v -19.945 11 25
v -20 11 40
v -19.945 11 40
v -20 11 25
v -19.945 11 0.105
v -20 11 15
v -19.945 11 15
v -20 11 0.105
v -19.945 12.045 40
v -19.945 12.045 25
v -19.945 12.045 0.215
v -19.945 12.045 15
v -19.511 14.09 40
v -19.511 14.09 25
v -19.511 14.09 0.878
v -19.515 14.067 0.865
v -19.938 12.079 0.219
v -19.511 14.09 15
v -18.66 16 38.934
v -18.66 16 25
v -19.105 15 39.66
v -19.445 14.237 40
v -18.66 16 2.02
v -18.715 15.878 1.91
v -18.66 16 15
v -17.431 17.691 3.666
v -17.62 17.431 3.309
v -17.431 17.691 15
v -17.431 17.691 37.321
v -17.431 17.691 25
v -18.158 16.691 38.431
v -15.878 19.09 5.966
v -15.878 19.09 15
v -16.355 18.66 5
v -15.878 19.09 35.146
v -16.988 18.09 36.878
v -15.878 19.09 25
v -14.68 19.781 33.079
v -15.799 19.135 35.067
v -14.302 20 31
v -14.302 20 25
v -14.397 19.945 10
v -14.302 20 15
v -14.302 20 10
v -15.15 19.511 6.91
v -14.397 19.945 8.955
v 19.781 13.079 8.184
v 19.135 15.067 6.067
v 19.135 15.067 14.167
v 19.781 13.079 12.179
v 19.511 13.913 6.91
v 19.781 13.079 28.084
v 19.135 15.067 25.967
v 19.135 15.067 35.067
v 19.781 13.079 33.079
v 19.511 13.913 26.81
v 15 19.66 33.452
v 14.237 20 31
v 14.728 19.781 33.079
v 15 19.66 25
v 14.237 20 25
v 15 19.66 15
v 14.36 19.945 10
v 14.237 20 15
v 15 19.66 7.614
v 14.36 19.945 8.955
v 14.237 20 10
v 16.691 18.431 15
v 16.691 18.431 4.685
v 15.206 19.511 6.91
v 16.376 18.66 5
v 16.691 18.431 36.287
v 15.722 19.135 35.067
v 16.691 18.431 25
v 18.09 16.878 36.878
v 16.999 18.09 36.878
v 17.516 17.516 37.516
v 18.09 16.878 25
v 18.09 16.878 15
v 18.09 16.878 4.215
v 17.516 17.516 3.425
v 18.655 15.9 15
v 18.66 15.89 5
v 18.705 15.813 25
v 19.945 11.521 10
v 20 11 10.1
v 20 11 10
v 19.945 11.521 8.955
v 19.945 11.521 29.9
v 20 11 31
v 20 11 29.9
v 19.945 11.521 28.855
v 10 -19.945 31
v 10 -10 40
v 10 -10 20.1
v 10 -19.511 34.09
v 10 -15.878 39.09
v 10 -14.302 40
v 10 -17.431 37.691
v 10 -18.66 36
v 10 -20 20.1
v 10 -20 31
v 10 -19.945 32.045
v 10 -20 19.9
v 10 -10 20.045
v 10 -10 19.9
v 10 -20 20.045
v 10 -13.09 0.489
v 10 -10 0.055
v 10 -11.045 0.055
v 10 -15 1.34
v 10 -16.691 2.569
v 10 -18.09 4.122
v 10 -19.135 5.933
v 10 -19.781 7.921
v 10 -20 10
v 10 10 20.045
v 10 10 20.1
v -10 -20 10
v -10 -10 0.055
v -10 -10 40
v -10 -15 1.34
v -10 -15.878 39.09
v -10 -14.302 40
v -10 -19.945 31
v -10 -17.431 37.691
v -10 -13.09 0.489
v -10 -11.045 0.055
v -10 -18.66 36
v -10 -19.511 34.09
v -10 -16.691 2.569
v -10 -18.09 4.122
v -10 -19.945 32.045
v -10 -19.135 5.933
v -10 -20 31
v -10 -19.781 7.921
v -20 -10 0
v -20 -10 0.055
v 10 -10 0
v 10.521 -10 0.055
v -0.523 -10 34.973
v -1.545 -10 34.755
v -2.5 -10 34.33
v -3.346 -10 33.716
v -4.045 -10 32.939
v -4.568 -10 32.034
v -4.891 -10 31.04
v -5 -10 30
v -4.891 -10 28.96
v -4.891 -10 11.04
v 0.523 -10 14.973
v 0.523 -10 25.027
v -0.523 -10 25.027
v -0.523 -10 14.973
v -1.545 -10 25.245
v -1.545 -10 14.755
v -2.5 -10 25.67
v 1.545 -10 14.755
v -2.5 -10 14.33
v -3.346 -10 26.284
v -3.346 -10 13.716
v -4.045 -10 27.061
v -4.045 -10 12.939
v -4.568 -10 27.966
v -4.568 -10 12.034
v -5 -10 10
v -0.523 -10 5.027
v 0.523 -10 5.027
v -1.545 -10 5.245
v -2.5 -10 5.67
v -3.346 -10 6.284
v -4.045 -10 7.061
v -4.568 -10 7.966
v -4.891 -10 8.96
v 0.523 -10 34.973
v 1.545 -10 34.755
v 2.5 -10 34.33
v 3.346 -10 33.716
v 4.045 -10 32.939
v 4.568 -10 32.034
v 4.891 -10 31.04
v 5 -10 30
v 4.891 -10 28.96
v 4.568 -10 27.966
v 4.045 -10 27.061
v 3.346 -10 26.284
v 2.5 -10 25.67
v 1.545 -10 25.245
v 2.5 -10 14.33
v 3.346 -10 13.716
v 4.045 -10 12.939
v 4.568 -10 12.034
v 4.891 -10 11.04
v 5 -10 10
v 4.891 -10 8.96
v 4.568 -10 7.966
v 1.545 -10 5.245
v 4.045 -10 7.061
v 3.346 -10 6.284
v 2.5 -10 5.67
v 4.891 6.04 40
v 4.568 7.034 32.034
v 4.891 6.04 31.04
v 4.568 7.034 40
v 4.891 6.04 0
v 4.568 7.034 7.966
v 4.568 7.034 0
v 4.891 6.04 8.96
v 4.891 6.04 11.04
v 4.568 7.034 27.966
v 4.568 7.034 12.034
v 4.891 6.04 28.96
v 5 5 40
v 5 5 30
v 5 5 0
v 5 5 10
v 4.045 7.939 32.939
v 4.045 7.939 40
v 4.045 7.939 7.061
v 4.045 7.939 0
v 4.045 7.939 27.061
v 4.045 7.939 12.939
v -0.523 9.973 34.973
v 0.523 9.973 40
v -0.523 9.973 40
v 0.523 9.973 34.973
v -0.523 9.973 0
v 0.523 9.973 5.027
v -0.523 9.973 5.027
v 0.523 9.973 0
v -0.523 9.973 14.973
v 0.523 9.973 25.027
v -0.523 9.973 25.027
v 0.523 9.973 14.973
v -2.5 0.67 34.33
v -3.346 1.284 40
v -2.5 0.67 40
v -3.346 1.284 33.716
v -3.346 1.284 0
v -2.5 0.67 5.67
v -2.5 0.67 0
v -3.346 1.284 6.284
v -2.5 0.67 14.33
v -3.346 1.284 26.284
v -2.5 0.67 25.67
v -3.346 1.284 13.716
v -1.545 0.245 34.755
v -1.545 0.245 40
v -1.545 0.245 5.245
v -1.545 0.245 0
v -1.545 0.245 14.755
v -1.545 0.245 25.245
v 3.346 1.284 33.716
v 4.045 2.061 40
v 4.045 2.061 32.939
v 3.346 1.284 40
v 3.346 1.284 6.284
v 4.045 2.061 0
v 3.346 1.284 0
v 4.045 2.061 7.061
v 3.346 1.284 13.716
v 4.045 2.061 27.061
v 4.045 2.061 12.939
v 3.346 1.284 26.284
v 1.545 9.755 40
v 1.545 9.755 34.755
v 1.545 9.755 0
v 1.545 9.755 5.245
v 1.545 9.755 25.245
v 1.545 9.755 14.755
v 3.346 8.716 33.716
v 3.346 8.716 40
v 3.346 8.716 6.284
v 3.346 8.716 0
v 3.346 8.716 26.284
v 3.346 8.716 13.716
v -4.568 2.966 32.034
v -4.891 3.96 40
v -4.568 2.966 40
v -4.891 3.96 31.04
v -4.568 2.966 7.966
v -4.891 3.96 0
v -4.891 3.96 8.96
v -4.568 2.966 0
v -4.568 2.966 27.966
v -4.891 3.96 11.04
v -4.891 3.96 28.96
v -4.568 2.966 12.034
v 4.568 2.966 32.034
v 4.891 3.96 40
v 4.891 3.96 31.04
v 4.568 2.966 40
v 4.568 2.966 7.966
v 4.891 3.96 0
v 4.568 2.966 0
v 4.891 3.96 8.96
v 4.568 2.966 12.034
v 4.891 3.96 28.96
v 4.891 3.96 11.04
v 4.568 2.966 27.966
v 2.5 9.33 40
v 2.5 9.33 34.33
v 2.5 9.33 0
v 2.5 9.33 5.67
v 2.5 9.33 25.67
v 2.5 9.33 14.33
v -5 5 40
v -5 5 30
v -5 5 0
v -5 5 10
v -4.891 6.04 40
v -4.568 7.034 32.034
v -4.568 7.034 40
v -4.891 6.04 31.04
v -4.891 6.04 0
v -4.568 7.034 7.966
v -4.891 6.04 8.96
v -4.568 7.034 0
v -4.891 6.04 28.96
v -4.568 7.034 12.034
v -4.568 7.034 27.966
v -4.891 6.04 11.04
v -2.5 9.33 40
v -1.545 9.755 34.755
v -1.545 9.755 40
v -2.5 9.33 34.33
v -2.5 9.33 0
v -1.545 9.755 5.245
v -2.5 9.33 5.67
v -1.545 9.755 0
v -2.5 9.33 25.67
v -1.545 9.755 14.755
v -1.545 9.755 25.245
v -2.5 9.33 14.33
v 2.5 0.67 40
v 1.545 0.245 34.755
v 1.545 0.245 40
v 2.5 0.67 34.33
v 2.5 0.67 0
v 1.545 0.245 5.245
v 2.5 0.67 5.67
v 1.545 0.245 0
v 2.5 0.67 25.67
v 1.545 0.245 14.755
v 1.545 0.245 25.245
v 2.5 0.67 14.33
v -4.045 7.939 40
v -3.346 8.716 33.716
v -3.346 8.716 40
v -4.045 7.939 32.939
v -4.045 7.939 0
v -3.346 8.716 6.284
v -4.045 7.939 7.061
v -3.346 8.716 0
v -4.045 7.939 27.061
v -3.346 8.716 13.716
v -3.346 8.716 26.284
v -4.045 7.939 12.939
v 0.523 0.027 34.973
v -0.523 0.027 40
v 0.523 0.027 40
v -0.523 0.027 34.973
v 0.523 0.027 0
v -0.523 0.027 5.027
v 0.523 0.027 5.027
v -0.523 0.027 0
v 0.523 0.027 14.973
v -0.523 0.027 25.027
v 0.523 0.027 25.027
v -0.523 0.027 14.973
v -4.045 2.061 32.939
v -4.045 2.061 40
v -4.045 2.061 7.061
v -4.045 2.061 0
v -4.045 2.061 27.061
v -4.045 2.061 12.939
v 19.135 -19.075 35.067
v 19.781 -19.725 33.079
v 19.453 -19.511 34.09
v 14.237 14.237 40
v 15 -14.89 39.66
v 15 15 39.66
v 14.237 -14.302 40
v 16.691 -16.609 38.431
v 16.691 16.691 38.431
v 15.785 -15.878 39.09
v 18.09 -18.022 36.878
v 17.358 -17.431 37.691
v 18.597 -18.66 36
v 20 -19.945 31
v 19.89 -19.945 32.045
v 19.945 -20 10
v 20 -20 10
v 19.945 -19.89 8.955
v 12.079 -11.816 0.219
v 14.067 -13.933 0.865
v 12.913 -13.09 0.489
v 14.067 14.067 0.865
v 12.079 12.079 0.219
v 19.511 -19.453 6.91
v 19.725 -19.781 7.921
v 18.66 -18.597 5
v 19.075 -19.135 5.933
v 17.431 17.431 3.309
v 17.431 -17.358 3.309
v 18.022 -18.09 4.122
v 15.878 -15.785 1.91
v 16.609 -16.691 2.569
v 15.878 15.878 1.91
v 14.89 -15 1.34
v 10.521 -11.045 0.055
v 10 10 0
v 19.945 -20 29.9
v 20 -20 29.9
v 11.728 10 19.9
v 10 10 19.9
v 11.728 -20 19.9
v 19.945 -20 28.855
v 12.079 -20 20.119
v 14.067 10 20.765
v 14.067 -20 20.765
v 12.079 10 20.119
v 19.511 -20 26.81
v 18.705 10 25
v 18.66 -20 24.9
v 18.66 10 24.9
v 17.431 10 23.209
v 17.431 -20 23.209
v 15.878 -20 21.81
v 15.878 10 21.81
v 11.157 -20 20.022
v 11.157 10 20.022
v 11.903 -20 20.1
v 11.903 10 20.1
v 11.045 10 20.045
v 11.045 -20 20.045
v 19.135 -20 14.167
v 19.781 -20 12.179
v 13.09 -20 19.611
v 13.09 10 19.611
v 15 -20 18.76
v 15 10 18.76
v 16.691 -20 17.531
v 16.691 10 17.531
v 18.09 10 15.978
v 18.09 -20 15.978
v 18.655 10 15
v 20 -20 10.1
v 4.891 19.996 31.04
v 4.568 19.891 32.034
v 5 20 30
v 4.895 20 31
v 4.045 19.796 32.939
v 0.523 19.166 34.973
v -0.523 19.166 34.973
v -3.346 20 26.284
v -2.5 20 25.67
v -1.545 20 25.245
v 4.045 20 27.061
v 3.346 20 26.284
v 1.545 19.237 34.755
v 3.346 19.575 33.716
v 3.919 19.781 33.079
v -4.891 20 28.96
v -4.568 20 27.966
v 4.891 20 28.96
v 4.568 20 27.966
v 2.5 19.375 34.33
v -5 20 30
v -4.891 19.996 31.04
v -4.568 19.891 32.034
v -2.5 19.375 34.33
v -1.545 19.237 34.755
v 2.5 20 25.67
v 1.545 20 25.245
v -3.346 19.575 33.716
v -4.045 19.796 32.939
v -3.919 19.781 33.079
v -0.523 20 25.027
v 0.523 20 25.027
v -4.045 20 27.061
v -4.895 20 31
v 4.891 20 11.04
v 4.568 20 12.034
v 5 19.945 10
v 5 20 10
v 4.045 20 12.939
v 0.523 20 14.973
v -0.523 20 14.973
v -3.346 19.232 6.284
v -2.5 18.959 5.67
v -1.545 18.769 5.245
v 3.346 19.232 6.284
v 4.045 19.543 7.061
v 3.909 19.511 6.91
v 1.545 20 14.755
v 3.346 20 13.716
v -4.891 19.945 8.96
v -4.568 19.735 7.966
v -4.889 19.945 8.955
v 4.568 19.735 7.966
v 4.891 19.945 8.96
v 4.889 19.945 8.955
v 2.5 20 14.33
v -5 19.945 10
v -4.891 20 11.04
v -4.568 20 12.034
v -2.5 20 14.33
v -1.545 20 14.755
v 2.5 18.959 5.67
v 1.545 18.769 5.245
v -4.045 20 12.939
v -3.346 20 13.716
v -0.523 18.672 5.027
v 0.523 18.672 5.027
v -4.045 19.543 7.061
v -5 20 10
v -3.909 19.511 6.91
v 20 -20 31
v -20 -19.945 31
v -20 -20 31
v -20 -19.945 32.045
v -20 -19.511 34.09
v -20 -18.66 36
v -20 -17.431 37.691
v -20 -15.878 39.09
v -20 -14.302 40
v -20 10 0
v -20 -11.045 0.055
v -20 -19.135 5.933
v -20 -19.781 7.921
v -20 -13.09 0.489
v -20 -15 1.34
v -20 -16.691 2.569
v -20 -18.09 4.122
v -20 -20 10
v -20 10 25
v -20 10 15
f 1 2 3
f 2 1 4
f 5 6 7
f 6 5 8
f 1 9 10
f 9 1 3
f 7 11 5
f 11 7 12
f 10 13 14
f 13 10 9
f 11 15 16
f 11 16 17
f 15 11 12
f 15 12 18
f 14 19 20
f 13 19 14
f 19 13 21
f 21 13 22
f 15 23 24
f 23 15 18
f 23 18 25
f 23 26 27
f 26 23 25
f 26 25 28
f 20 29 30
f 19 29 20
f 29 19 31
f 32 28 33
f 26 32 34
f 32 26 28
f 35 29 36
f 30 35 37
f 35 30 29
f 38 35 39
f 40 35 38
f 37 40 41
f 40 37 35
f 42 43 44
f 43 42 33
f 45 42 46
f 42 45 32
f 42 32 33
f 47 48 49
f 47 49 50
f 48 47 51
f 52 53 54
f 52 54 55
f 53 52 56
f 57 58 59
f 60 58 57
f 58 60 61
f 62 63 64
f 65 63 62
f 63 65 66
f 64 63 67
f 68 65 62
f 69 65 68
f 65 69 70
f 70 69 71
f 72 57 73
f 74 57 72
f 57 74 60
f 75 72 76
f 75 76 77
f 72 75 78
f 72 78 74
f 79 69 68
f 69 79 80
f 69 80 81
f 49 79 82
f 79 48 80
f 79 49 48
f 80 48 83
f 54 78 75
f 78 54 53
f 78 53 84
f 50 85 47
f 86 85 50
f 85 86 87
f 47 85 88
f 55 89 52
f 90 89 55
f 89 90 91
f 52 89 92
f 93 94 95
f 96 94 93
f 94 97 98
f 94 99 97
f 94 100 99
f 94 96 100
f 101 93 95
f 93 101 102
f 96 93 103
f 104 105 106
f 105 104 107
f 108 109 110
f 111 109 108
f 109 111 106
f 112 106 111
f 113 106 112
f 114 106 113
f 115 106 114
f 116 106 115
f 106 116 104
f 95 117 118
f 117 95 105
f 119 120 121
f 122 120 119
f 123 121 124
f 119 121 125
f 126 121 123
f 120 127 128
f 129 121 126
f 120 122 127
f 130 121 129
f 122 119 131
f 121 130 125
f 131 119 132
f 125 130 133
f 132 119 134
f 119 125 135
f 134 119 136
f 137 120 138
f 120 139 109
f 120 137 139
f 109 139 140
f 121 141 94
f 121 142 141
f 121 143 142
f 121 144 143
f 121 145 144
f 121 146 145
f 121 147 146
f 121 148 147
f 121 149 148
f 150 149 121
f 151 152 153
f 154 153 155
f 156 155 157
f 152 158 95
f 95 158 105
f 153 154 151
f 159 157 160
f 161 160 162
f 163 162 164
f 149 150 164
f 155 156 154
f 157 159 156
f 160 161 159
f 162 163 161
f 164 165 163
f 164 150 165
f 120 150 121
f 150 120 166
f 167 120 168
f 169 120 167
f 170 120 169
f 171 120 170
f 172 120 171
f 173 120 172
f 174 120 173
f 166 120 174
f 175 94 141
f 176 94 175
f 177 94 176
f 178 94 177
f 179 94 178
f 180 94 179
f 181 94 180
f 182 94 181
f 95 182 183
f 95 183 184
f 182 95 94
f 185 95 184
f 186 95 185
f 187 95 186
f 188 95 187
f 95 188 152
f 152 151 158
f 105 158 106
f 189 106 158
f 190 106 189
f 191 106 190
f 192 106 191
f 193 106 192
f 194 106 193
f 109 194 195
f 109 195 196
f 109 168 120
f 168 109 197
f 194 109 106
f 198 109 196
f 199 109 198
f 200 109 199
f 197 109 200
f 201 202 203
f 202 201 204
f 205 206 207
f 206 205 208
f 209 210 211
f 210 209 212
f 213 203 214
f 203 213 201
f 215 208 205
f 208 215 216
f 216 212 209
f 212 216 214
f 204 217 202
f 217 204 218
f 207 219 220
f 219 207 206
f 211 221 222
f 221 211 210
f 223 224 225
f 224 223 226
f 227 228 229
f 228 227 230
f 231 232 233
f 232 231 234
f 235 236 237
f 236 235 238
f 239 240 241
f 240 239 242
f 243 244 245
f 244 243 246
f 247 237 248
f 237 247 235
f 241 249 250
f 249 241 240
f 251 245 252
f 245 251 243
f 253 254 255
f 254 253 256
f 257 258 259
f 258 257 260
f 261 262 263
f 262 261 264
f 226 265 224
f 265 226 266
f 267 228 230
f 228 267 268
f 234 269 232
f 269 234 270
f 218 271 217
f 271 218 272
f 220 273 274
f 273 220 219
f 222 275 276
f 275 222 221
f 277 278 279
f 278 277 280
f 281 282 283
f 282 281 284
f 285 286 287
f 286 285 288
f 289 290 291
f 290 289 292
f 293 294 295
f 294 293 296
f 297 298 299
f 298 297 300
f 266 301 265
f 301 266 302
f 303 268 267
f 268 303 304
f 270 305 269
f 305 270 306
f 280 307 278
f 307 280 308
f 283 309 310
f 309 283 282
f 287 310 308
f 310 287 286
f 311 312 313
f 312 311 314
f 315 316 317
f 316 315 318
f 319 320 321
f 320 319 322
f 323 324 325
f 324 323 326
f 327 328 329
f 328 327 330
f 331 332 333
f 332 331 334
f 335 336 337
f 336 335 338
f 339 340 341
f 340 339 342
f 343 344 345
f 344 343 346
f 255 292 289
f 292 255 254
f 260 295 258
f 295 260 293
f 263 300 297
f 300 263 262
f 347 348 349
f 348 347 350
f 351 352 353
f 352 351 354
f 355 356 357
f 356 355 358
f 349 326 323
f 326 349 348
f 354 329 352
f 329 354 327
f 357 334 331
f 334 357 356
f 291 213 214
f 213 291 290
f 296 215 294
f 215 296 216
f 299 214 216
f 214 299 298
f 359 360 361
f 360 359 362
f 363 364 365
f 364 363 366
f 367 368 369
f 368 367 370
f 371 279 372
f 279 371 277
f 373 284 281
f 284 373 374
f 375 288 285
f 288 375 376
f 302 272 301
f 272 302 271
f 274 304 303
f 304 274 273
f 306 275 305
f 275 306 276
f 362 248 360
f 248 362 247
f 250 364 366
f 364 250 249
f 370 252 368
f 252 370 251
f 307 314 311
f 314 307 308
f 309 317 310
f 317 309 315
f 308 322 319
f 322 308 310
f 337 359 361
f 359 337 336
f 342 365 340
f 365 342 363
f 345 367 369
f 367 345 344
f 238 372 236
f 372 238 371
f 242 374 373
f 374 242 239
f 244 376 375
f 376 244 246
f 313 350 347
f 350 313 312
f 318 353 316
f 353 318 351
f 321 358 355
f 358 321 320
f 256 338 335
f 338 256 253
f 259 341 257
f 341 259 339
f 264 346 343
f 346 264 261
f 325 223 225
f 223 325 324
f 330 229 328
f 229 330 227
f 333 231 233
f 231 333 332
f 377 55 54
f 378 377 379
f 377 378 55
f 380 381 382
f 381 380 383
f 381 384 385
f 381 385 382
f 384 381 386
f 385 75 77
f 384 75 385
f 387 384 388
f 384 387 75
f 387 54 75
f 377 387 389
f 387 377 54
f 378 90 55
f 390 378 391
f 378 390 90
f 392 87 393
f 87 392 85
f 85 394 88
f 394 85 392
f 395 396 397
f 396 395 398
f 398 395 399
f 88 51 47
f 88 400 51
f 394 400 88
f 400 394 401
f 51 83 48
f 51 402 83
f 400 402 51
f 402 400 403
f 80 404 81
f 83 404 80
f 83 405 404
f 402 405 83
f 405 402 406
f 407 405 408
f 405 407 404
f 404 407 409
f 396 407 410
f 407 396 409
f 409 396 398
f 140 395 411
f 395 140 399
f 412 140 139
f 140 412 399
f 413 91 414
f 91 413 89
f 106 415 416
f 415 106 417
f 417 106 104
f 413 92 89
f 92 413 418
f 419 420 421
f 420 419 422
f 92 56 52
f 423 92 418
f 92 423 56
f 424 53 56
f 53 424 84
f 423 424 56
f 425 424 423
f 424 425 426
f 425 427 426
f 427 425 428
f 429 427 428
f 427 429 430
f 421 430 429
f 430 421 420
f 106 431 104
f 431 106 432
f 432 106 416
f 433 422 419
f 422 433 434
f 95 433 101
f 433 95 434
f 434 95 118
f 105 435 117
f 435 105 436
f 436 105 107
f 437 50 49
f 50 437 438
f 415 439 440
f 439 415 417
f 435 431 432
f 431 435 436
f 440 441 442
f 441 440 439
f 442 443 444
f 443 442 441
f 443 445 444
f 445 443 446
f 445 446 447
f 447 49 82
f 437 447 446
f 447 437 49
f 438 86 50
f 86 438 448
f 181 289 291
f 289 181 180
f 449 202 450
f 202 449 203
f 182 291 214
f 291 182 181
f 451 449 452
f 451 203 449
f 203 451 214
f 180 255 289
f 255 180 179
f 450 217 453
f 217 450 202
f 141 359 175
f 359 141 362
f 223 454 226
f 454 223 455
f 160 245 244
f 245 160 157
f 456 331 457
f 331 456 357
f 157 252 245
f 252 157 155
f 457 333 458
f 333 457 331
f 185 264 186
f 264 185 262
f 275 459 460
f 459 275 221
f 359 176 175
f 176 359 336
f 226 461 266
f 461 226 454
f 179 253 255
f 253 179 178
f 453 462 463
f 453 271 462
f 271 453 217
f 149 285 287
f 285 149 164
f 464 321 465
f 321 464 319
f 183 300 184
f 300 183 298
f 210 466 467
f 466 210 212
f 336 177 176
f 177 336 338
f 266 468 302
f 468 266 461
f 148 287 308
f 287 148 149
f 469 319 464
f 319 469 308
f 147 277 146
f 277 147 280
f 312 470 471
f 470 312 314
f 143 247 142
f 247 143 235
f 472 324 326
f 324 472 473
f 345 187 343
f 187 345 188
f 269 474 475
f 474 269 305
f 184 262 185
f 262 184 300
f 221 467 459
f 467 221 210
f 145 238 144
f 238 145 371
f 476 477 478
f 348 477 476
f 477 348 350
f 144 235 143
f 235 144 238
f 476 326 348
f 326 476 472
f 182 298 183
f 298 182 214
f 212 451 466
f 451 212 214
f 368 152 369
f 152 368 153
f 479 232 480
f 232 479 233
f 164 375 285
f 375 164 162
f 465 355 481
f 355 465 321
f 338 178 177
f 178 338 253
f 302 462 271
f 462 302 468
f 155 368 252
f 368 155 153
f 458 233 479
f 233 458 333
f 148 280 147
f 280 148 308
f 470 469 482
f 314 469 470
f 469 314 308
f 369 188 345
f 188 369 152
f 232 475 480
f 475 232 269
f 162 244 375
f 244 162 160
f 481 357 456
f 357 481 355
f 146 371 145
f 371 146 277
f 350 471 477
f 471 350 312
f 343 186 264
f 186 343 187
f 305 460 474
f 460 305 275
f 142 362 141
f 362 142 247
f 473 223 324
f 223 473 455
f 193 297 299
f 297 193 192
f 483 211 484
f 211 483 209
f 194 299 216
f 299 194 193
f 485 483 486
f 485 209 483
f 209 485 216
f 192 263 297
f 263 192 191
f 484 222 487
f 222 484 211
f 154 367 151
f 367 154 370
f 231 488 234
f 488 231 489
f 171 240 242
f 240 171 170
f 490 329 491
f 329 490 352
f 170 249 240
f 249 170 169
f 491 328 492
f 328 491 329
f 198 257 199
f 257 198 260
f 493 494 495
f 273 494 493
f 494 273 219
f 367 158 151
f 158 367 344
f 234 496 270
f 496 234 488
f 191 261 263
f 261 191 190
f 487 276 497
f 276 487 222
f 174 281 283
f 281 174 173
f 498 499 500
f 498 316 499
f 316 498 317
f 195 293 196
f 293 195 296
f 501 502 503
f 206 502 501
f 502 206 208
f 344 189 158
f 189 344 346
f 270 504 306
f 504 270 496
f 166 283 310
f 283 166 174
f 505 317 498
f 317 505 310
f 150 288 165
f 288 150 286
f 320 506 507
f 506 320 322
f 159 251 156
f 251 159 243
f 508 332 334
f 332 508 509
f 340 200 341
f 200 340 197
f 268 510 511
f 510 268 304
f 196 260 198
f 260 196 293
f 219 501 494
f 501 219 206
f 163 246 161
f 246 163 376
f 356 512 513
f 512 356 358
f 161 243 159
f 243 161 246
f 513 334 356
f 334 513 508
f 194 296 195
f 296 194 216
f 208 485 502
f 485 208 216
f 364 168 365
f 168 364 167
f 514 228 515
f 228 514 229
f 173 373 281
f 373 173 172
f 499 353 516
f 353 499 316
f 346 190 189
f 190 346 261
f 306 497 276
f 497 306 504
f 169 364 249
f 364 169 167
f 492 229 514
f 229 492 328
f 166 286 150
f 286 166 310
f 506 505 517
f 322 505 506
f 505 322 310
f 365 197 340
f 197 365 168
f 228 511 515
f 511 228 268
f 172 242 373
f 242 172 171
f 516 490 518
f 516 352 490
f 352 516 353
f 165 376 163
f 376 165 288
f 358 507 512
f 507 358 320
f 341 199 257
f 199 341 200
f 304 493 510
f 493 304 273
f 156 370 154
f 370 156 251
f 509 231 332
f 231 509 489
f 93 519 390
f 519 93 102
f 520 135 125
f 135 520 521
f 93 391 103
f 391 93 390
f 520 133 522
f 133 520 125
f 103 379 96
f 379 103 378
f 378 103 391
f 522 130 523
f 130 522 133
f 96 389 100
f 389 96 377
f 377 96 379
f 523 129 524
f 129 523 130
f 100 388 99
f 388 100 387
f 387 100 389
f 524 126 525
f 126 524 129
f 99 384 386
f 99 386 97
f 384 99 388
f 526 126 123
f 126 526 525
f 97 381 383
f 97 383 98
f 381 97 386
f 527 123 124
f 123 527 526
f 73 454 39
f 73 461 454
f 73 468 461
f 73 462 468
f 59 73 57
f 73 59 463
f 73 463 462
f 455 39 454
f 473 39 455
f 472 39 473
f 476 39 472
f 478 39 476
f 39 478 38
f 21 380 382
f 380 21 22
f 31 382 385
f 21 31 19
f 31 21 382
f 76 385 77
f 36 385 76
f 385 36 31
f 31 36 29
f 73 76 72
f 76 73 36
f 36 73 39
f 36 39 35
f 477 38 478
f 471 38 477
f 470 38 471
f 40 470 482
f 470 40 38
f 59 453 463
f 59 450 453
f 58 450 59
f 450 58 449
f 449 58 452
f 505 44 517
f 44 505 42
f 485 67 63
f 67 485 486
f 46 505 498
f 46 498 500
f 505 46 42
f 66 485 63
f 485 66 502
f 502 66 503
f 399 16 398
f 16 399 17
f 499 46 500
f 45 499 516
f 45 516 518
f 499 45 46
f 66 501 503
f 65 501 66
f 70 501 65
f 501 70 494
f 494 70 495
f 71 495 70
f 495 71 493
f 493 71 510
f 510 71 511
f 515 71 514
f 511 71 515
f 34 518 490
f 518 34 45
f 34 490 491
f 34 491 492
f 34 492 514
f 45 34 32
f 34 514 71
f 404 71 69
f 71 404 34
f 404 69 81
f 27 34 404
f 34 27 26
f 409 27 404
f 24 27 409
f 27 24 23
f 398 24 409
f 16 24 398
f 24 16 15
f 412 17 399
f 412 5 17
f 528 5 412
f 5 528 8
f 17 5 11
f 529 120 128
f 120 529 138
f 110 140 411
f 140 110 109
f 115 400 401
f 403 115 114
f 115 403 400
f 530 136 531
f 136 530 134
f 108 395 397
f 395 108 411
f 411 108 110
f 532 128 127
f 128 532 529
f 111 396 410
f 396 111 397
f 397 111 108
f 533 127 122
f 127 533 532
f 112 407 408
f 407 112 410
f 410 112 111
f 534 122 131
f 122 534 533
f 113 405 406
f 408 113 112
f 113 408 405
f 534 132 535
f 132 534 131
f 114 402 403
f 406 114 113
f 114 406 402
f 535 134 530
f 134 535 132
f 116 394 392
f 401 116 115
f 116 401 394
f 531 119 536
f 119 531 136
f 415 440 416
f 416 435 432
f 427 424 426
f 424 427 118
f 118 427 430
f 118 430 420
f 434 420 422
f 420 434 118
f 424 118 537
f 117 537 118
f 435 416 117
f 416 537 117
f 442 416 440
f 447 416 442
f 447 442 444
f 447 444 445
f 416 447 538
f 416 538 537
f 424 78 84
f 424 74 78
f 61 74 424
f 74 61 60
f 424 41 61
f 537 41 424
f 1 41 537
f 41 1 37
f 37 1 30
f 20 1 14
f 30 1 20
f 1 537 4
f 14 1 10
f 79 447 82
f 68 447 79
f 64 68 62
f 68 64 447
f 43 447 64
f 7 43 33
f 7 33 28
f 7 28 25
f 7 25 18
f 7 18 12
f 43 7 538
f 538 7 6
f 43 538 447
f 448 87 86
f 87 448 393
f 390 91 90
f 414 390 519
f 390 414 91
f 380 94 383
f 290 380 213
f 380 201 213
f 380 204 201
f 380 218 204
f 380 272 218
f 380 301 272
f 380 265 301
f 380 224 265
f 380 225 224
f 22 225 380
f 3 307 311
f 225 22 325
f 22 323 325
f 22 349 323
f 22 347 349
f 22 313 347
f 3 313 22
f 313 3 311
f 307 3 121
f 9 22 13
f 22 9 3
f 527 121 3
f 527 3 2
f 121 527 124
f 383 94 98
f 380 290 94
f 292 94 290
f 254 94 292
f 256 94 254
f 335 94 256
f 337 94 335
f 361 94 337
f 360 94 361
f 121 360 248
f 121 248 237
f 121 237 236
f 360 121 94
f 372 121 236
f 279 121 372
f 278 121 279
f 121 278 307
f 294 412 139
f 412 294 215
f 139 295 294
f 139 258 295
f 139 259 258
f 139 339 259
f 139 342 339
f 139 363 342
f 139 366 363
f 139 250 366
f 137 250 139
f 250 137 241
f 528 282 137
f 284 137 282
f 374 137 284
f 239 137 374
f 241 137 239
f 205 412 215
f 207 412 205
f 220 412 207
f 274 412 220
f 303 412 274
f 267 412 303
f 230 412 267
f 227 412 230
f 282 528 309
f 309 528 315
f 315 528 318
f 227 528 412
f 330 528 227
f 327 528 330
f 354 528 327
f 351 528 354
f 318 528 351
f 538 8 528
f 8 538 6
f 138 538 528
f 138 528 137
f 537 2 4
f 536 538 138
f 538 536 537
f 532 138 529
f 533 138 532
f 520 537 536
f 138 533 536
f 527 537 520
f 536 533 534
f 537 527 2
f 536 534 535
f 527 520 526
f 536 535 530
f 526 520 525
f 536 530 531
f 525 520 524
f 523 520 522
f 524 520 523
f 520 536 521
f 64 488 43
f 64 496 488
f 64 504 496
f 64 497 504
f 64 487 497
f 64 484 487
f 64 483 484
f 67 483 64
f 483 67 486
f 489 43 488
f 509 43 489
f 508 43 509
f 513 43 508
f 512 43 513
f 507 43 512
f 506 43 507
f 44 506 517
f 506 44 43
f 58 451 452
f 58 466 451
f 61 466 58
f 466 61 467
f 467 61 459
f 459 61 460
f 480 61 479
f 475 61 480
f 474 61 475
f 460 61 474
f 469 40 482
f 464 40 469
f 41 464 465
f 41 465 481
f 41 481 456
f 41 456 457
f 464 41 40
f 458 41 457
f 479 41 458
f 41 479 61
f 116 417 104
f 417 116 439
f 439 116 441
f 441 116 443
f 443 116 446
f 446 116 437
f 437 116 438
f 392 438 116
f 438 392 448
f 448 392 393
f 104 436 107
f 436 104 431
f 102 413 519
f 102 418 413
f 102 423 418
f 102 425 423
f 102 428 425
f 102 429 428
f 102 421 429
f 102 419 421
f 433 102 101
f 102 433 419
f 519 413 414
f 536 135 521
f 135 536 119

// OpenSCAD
// Monogram Cube
// v 1.1
// Inspired by the cover art of Douglas Hofstadter's "Godel, Escher, Bach"
//
// (C) Copyright 2013, Brian Enigma, some rights reserved.
//
// Monogram Cube by Brian Enigma is licensed under a Creative Commons 
// Attribution-ShareAlike 3.0 Unported License.
//
// - http://netninja.com
// - http://www.thingiverse.com/BrianEnigma

// Note that certain letter combinations don't work well, especially with the "alternate" typeface.

SIZE = 40 * 1;
DETAIL = 30 * 1;

// The typeface to use.  "Blocks" yields better results, but is more stylistic and block-like.  It reminds me of some display typefaces from the 20s and 30s. It has smaller overhangs and is easier to print.  "Alternate" results in more consistently letter-like, less stylized results, but has more overhangs and is harder to print.
typeface = "blocks";     // [blocks, alternate]

top_letter = "A";        // [A,B,C,D,E,F,G,H,I,J,K,L,M,N,O,P,Q,R,S,T,U,V,W,X,Y,Z,None]
left_side_letter = "B";  // [A,B,C,D,E,F,G,H,I,J,K,L,M,N,O,P,Q,R,S,T,U,V,W,X,Y,Z,None]
right_side_letter = "C"; // [A,B,C,D,E,F,G,H,I,J,K,L,M,N,O,P,Q,R,S,T,U,V,W,X,Y,Z,None]


//include <letters.scad>

// ----------------------------------------
// Monogram Cube
// v 1.1
// Inspired by the cover art of Douglas Hofstadter's "Godel, Escher, Bach"
//
// (C) Copyright 2013, Brian Enigma, some rights reserved.
//
// Monogram Cube by Brian Enigma is licensed under a Creative Commons 
// Attribution-ShareAlike 3.0 Unported License.
//
// - http://netninja.com
// - http://www.thingiverse.com/BrianEnigma

// arc() builds a lower-left corner arc by default
// +
// |\
// |  \
// |    \
// +------+
module arc(cubeSize, rotation, x, y)
{
    translate(v = [(cubeSize / 4 + 1) / 2 + x, (cubeSize / 4 + 1) / 2 + y, (cubeSize + 2) / 2 - 1])
		rotate(a = [0, 0, -1 * rotation])
		    translate(v = [(cubeSize / 4 + 1) / -2, (cubeSize / 4 + 1) / -2, (cubeSize + 2) / -2])
		        difference()
		        {
		            cube(size = [cubeSize / 4 + 1, cubeSize / 4 + 1, cubeSize + 2]);
		            translate(v = [cubeSize / 4 + 1, cubeSize / 4 + 1, 0])
		                cylinder(r = cubeSize / 4, h = cubeSize + 2, $fn = DETAIL);
		        }
}

module arcWithMargin(cubeSize, rotation, marginX, marginY, x, y)
{
	if (90 == rotation || 270 == rotation)
	{
	    translate(v = [(cubeSize / 4 + marginY) / 2 + x, (cubeSize / 4 + marginX) / 2 + y, (cubeSize + 2) / 2 - 1])
			rotate(a = [0, 0, -1 * rotation])
			    translate(v = [(cubeSize / 4 + marginX) / -2, (cubeSize / 4 + marginY) / -2, (cubeSize + 2) / -2])
			        difference()
			        {
			            cube(size = [cubeSize / 4 + marginX, cubeSize / 4 + marginY, cubeSize + 2]);
			            translate(v = [cubeSize / 4 + marginX, cubeSize / 4 + marginY, 0])
			                cylinder(r = cubeSize / 4, h = cubeSize + 2, $fn = DETAIL);
			        }
	} else {
	    translate(v = [(cubeSize / 4 + marginX) / 2 + x, (cubeSize / 4 + marginY) / 2 + y, (cubeSize + 2) / 2 - 1])
			rotate(a = [0, 0, -1 * rotation])
			    translate(v = [(cubeSize / 4 + marginX) / -2, (cubeSize / 4 + marginY) / -2, (cubeSize + 2) / -2])
			        difference()
			        {
			            cube(size = [cubeSize / 4 + marginX, cubeSize / 4 + marginY, cubeSize + 2]);
			            translate(v = [cubeSize / 4 + marginX, cubeSize / 4 + marginY, 0])
			                cylinder(r = cubeSize / 4, h = cubeSize + 2, $fn = DETAIL);
			        }
	}
}

module carveLetterA(cubeSize)
{
    // lower cut-out
    translate(v = [cubeSize / 4, -1, -1])
        cube(size = [cubeSize / 2, cubeSize / 4 + 1, cubeSize + 2]);
    // center hole
    translate(v = [cubeSize / 2, cubeSize * 5 / 8, -1])
        cylinder(r = cubeSize / 8, h = cubeSize + 2, $fn = DETAIL);
    // top left corner curve
	arc(cubeSize, 90, -1, cubeSize * 3 / 4 + 1);
    // top right corner curve
	arc(cubeSize, 180, cubeSize * 3 / 4, cubeSize * 3 / 4 + 1);
}

module carveLetterB(cubeSize)
{
    // center holes
    translate(v = [cubeSize / 2, cubeSize * 3 / 4, -1])
        cylinder(r = cubeSize / 8, h = cubeSize + 2, $fn = DETAIL);
    translate(v = [cubeSize / 2, cubeSize * 1 / 4, -1])
        cylinder(r = cubeSize / 8, h = cubeSize + 2, $fn = DETAIL);
    // top right corner curve
	arc(cubeSize, 180, cubeSize * 3 / 4, cubeSize * 3 / 4 + 1);
    // bottom right corner curve
	arc(cubeSize, 270, cubeSize * 3 / 4, -1);
    // edge divot
	arcWithMargin(cubeSize, 270, 0, 5, cubeSize * 3 / 4, cubeSize / 2 - 0.1); // upper
	arcWithMargin(cubeSize, 180, 5, 0, cubeSize * 3 / 4, cubeSize / 4 + 0.1); // lower
}

module carveLetterC(cubeSize)
{
    // top left corner curve
	arc(cubeSize, 90, -1, cubeSize * 3 / 4 + 1);
    // top right corner curve
	arc(cubeSize, 180, cubeSize * 3 / 4, cubeSize * 3 / 4 + 1);
    // bottom right corner curve
	arc(cubeSize, 270, cubeSize * 3 / 4, -1);
    // bottom left corner curve
	arc(cubeSize, 0, -1, -1);
	// Cutout
    translate(v = [cubeSize * 3 / 4, cubeSize * 3 / 8, -1])
		cube(size = [cubeSize / 4 + 1, cubeSize / 4, cubeSize + 2]);
}

module carveLetterCAlt(cubeSize)
{
    // top left corner curve
	arc(cubeSize, 90, -1, cubeSize * 3 / 4 + 1);
    // top right corner curve
	arc(cubeSize, 180, cubeSize * 3 / 4, cubeSize * 3 / 4 + 1);
    // bottom right corner curve
	arc(cubeSize, 270, cubeSize * 3 / 4, -1);
    // bottom left corner curve
	arc(cubeSize, 0, -1, -1);
	// Cutout
	translate(v = [cubeSize / 2, cubeSize / 2, -1])
		cylinder(r = cubeSize / 4, h = cubeSize + 2, $fn = DETAIL);
    translate(v = [cubeSize / 2, cubeSize / 4, -1])
		cube(size = [cubeSize / 2 + 1, cubeSize / 2, cubeSize + 2]);
}

module carveLetterD(cubeSize)
{
    // center hole
    translate(v = [cubeSize / 2, cubeSize / 2, -1])
        cylinder(r = cubeSize / 8, h = cubeSize + 2, $fn = DETAIL);
    // top right corner curve
	arc(cubeSize, 180, cubeSize * 3 / 4, cubeSize * 3 / 4 + 1);
    // bottom right corner curve
	arc(cubeSize, 270, cubeSize * 3 / 4, -1);
}

module carveLetterDAlt(cubeSize)
{
    // top right corner curve
	arc(cubeSize, 180, cubeSize * 3 / 4, cubeSize * 3 / 4 + 1);
    // bottom right corner curve
	arc(cubeSize, 270, cubeSize * 3 / 4, -1);
	// Cutout
	translate(v = [cubeSize / 2, cubeSize / 2, -1])
		cylinder(r = cubeSize / 4, h = cubeSize + 2, $fn = DETAIL);
    translate(v = [cubeSize / 4, cubeSize / 4, -1])
		cube(size = [cubeSize / 4, cubeSize / 2, cubeSize + 2]);
}

module carveLetterE(cubeSize)
{
    // upper cut-out
    translate(v = [cubeSize * 3 / 4, cubeSize * 5 / 8, -1])
        cube(size = [cubeSize / 4 + 1, cubeSize / 8, cubeSize + 2]);
    // lower cut-out
    translate(v = [cubeSize * 3 / 4, cubeSize / 4, -1])
        cube(size = [cubeSize / 4 + 1, cubeSize / 8, cubeSize + 2]);
}

module carveLetterEAlt(cubeSize)
{
    // upper cut-out
    translate(v = [cubeSize / 4, cubeSize * 5 / 8, -1])
        cube(size = [cubeSize * 3 / 4 + 1, cubeSize / 8, cubeSize + 2]);
    // lower cut-out
    translate(v = [cubeSize / 4, cubeSize  / 4, -1])
        cube(size = [cubeSize * 3 / 4 + 1, cubeSize / 8, cubeSize + 2]);
	// middle prong
    translate(v = [cubeSize * 5 / 8, cubeSize * 3 / 8 - 1, -1])
        cube(size = [cubeSize / 2, cubeSize / 4 + 2, cubeSize + 2]);
}

module carveLetterF(cubeSize)
{
	// Upper cutout
    translate(v = [cubeSize * 3 / 4, cubeSize / 2, -1])
		cube(size = [cubeSize / 4 + 1, cubeSize / 4, cubeSize + 2]);
	// Lower cutout
    translate(v = [cubeSize * 3 / 4, -1, -1])
		cube(size = [cubeSize / 4 + 1, cubeSize / 4 + 1, cubeSize + 2]);
}

module carveLetterFAlt(cubeSize)
{
	// Upper cutout
    translate(v = [cubeSize / 4, cubeSize / 2, -1])
		cube(size = [cubeSize * 3/ 4 + 1, cubeSize / 4, cubeSize + 2]);
	// Lower cutout
    translate(v = [cubeSize / 4, -1, -1])
		cube(size = [cubeSize * 3 / 4 + 1, cubeSize / 4 + 1, cubeSize + 2]);
    translate(v = [cubeSize * 5 / 8, cubeSize / 4 - 1, -1])
        cube(size = [cubeSize / 2, cubeSize / 4 + 2, cubeSize + 2]);
}

module carveLetterG(cubeSize)
{
    // top left corner curve
	arc(cubeSize, 90, -1, cubeSize * 3 / 4 + 1);
    // top right corner curve
	arc(cubeSize, 180, cubeSize * 3 / 4, cubeSize * 3 / 4 + 1);
    // bottom left corner curve
	arc(cubeSize, 0, -1, -1);
	// Cutout
    translate(v = [cubeSize * 3 / 4, cubeSize * 3 / 8, -1])
		cube(size = [cubeSize / 4 + 1, cubeSize / 4, cubeSize + 2]);
}

module carveLetterGAlt(cubeSize)
{
    // top left corner curve
	arc(cubeSize, 90, -1, cubeSize * 3 / 4 + 1);
    // top right corner curve
	arc(cubeSize, 180, cubeSize * 3 / 4, cubeSize * 3 / 4 + 1);
    // bottom left corner curve
	arc(cubeSize, 0, -1, -1);
	// Cutout
	translate(v = [cubeSize / 2, cubeSize / 2, -1])
		cylinder(r = cubeSize / 4, h = cubeSize + 2, $fn = DETAIL);
    translate(v = [cubeSize / 2, cubeSize / 2, -1])
		cube(size = [cubeSize / 2 + 1, cubeSize / 4, cubeSize + 2]);
    translate(v = [cubeSize / 2, cubeSize / 4, -1])
		cube(size = [cubeSize / 4, cubeSize / 4 + 1, cubeSize + 2]);
}

module carveLetterH(cubeSize)
{
    // lower cut-out
    translate(v = [cubeSize / 4, -1, -1])
        cube(size = [cubeSize / 2, cubeSize / 4 + 1, cubeSize + 2]);
    // upper cut-out
    translate(v = [cubeSize / 4, cubeSize * 3 / 4, -1])
        cube(size = [cubeSize / 2, cubeSize / 4 + 1, cubeSize + 2]);
}

module carveLetterHAlt(cubeSize)
{
    // lower cut-out
    translate(v = [cubeSize / 4, -1, -1])
        cube(size = [cubeSize / 2, cubeSize * 3 / 8 + 1, cubeSize + 2]);
    // upper cut-out
    translate(v = [cubeSize / 4, cubeSize * 5 / 8, -1])
        cube(size = [cubeSize / 2, cubeSize * 3 / 8 + 1, cubeSize + 2]);
}

module carveLetterI(cubeSize)
{
    // left cut-out
    translate(v = [-1, cubeSize / 4, -1])
        cube(size = [cubeSize / 4 + 1, cubeSize / 2, cubeSize + 2]);
    // right cut-out
    translate(v = [cubeSize * 3 / 4, cubeSize / 4, -1])
        cube(size = [ cubeSize / 4 + 1, cubeSize / 2,cubeSize + 2]);
}

module carveLetterIAlt(cubeSize)
{
    // left cut-out
    translate(v = [-1, cubeSize / 4, -1])
        cube(size = [cubeSize * 3 / 8 + 1, cubeSize / 2, cubeSize + 2]);
    // right cut-out
    translate(v = [cubeSize * 5 / 8, cubeSize / 4, -1])
        cube(size = [ cubeSize * 3 / 8 + 1, cubeSize / 2,cubeSize + 2]);
}

module carveLetterJ(cubeSize)
{
    //// top right corner curve
	//arc(cubeSize, 180, cubeSize * 3 / 4, cubeSize * 3 / 4 + 1);
    // bottom right corner curve
	arc(cubeSize, 270, cubeSize * 3 / 4, -1);
    // bottom left corner curve
	arc(cubeSize, 0, -1, -1);
	// Cutout
    translate(v = [-1, cubeSize / 2, -1])
		cube(size = [cubeSize / 4 + 1, cubeSize / 2 + 1, cubeSize + 2]);
}

module carveLetterJAlt(cubeSize)
{
    // bottom right corner curve
	arc(cubeSize, 270, cubeSize * 3 / 4, -1);
    // bottom left corner curve
	arc(cubeSize, 0, -1, -1);
	// Cutout
	translate(v = [cubeSize / 2, cubeSize / 2, -1])
		cylinder(r = cubeSize / 4, h = cubeSize + 2, $fn = DETAIL);
    translate(v = [-1, cubeSize / 2, -1])
		cube(size = [cubeSize * 3 / 4 + 1, cubeSize / 2 + 1, cubeSize + 2]);
}

module carveLetterK(cubeSize)
{
	// Upper leg
	translate(v = [cubeSize / 2, cubeSize, -1])
		cylinder(r = cubeSize / 4, h = cubeSize + 2, $fn = DETAIL);
	translate(v = [cubeSize / 4, cubeSize * 3 / 4, -1])
		cube(size = [cubeSize / 4, cubeSize / 4 + 1, cubeSize + 2]);
	// Lower leg
	translate(v = [cubeSize / 2, 0, -1])
		cylinder(r = cubeSize / 4, h = cubeSize + 2, $fn = DETAIL);
	translate(v = [cubeSize / 4, -1, -1])
		cube(size = [cubeSize / 4, cubeSize / 4 + 1, cubeSize + 2]);
    // edge divot
	arc(cubeSize, 270, cubeSize * 3 / 4, cubeSize / 2); // upper
	arc(cubeSize, 180, cubeSize * 3 / 4, cubeSize / 4); // lower
	
}

module carveLetterKAlt(cubeSize)
{
	// Upper leg
	translate(v = [cubeSize / 2, cubeSize * 7 / 8, -1])
		cylinder(r = cubeSize / 4, h = cubeSize + 2, $fn = DETAIL);
	translate(v = [cubeSize / 4, cubeSize * 5 / 8, -1])
		cube(size = [cubeSize / 4, cubeSize / 2, cubeSize + 2]);
	translate(v = [cubeSize / 2 - 1, cubeSize * 7 / 8, -1])
		cube(size = [cubeSize / 4 + 1, cubeSize / 4, cubeSize + 2]);
	// Lower leg
	translate(v = [cubeSize / 2, cubeSize / 8, -1])
		cylinder(r = cubeSize / 4, h = cubeSize + 2, $fn = DETAIL);
	translate(v = [cubeSize / 4, -1, -1])
		cube(size = [cubeSize / 4, cubeSize * 3 / 8 + 1, cubeSize + 2]);
	translate(v = [cubeSize / 2 - 1, -1, -1])
		cube(size = [cubeSize / 4 + 1, cubeSize / 8 + 1, cubeSize + 2]);
    // edge divot
	arc(cubeSize, 270, cubeSize * 3 / 4, cubeSize / 2); // upper
	arc(cubeSize, 180, cubeSize * 3 / 4, cubeSize / 4); // lower
	
}

module carveLetterL(cubeSize)
{
	// Cutout
    translate(v = [cubeSize * 3 / 4, cubeSize / 2, -1])
		cube(size = [cubeSize / 4 + 1, cubeSize / 2 + 1, cubeSize + 2]);
}

module carveLetterLAlt(cubeSize)
{
	// Cutout
    translate(v = [cubeSize / 4, cubeSize / 4, -1])
		cube(size = [cubeSize * 4 / 4 + 1, cubeSize * 3 / 4 + 1, cubeSize + 2]);
}

module carveLetterM(cubeSize)
{
    // top left corner curve
	arc(cubeSize, 90, -1, cubeSize * 3 / 4 + 1);
    // top right corner curve
	arc(cubeSize, 180, cubeSize * 3 / 4, cubeSize * 3 / 4 + 1);
    // divot
	arcWithMargin(cubeSize, 180, 0.1, 5, cubeSize / 4 + 0.1, cubeSize * 3 / 4); // left
	arcWithMargin(cubeSize,  90, 5, 0.1, cubeSize / 2 - 0.1, cubeSize * 3 / 4); // right
	// Cutouts
    translate(v = [cubeSize / 4, -1, -1])
		cube(size = [cubeSize / 8, cubeSize / 4 + 1, cubeSize + 2]);
    translate(v = [cubeSize * 5 / 8, -1, -1])
		cube(size = [cubeSize / 8, cubeSize / 4 + 1, cubeSize + 2]);
}

module carveLetterN(cubeSize)
{
    // top
	arcWithMargin(cubeSize, 180, 0, 5, cubeSize * 3 / 8, cubeSize * 3 / 4);
	// bottom
	arcWithMargin(cubeSize,   0, 0, 5, cubeSize * 3 / 8, -5);
}

module carveLetterO(cubeSize)
{
    // top left corner curve
	arc(cubeSize, 90, -1, cubeSize * 3 / 4 + 1);
    // top right corner curve
	arc(cubeSize, 180, cubeSize * 3 / 4, cubeSize * 3 / 4 + 1);
    // bottom right corner curve
	arc(cubeSize, 270, cubeSize * 3 / 4, -1);
    // bottom left corner curve
	arc(cubeSize, 0, -1, -1);
	// Cutout
    translate(v = [cubeSize / 2, cubeSize / 2, -1])
		cylinder(r = cubeSize / 8, h = cubeSize + 2,$fn = DETAIL);
}

module carveLetterOAlt(cubeSize)
{
    // top left corner curve
	arc(cubeSize, 90, -1, cubeSize * 3 / 4 + 1);
    // top right corner curve
	arc(cubeSize, 180, cubeSize * 3 / 4, cubeSize * 3 / 4 + 1);
    // bottom right corner curve
	arc(cubeSize, 270, cubeSize * 3 / 4, -1);
    // bottom left corner curve
	arc(cubeSize, 0, -1, -1);
	// Cutout
    translate(v = [cubeSize / 2, cubeSize / 2, -1])
		cylinder(r = cubeSize / 4, h = cubeSize + 2,$fn = DETAIL);
}

module carveLetterP(cubeSize)
{
    // center holes
    translate(v = [cubeSize / 2, cubeSize * 3 / 4, -1])
        cylinder(r = cubeSize / 8, h = cubeSize + 2, $fn = DETAIL);
    // top right corner curve
	arc(cubeSize, 180, cubeSize * 3 / 4, cubeSize * 3 / 4 + 1);
	arcWithMargin(cubeSize, 270, 5, 5, cubeSize * 3 / 4, cubeSize / 2 - 5);
	// cuout
	translate(v = [cubeSize * 3 / 4, -1, -1])
		cube(size = [cubeSize / 4 + 1, cubeSize / 2 + 1, cubeSize + 2]);
}

module carveLetterPAlt(cubeSize)
{
    // center holes
    translate(v = [cubeSize / 2, cubeSize * 3 / 4, -1])
        cylinder(r = cubeSize / 8, h = cubeSize + 2, $fn = DETAIL);
    // top right corner curve
	arc(cubeSize, 180, cubeSize * 3 / 4, cubeSize * 3 / 4 + 1);
	arcWithMargin(cubeSize, 270, 5, 5, cubeSize * 3 / 4, cubeSize / 2 - 5);
	// cuout
	translate(v = [cubeSize / 2, -1, -1])
		cube(size = [cubeSize / 2 + 1, cubeSize / 2 + 1, cubeSize + 2]);
}

module carveLetterQ(cubeSize)
{
    // top left corner curve
	arc(cubeSize, 90, -1, cubeSize * 3 / 4 + 1);
    // top right corner curve
	arc(cubeSize, 180, cubeSize * 3 / 4, cubeSize * 3 / 4 + 1);
    // bottom left corner curve
	arc(cubeSize, 0, -1, -1);
	// Cutout
    translate(v = [cubeSize / 2, cubeSize / 2, -1])
		cylinder(r = cubeSize / 8, h = cubeSize + 2,$fn = DETAIL);
}

module carveLetterR(cubeSize)
{
    // center holes
    translate(v = [cubeSize / 2, cubeSize * 3 / 4, -1])
        cylinder(r = cubeSize / 8, h = cubeSize + 2, $fn = DETAIL);
    // top right corner curve
	arc(cubeSize, 180, cubeSize * 3 / 4, cubeSize * 3 / 4 + 1);
	arcWithMargin(cubeSize, 270, 0, 5, cubeSize * 3 / 4, cubeSize / 2 - 0.1); // upper
	arcWithMargin(cubeSize, 180, 5, 0, cubeSize * 3 / 4, cubeSize / 4 + 0.1); // lower
	// cuout
	translate(v = [cubeSize / 2, 0, -1])
		cylinder(r = cubeSize / 4, h = cubeSize + 2, $fn = DETAIL);
	translate(v = [cubeSize / 4, -1, -1])
		cube(size = [cubeSize / 4, cubeSize / 4 + 1, cubeSize + 2]);
}

module carveLetterS(cubeSize)
{
    // top left corner curve
	arc(cubeSize, 90, -1, cubeSize * 3 / 4 + 1);
    // bottom right corner curve
	arc(cubeSize, 270, cubeSize * 3 / 4, -1);
    // left
	arcWithMargin(cubeSize,   0, 5, 0, -5, cubeSize * 3 / 8);
	// right
	arcWithMargin(cubeSize, 180, 5, 0, cubeSize * 3 / 4, cubeSize * 3 / 8);
}

module carveLetterT(cubeSize)
{
	translate(v = [-1, -1, -1])
		cube(size = [cubeSize / 4 + 1, cubeSize * 5 / 8 + 1, cubeSize + 2]);
	translate(v = [cubeSize * 3 / 4, -1, -1])
		cube(size = [cubeSize / 4 + 1, cubeSize * 5 / 8 + 1, cubeSize + 2]);
}

module carveLetterU(cubeSize)
{
    // bottom right corner curve
	arc(cubeSize, 270, cubeSize * 3 / 4, -1);
    // bottom left corner curve
	arc(cubeSize, 0, -1, -1);
	// Cutout
    translate(v = [cubeSize / 4, cubeSize * 3 / 4, -1])
		cube(size = [cubeSize / 2, cubeSize / 4 + 1, cubeSize + 2]);
}

module carveLetterUAlt(cubeSize)
{
    // bottom right corner curve
	arc(cubeSize, 270, cubeSize * 3 / 4, -1);
    // bottom left corner curve
	arc(cubeSize, 0, -1, -1);
	// Cutout
    translate(v = [cubeSize / 2, cubeSize / 2, -1])
		cylinder(r = cubeSize / 4, h = cubeSize + 2,$fn = DETAIL);
    translate(v = [cubeSize / 4, cubeSize / 2, -1])
		cube(size = [cubeSize / 2, cubeSize / 2 + 1, cubeSize + 2]);
}

module carveLetterV(cubeSize)
{
	translate(v = [0, 0, -1])
		linear_extrude(height = cubeSize + 2, center = false, convexity = 3)
			polygon(points = [[-0.1, cubeSize * 3 / 8], [cubeSize * 3 / 8, -0.1], [-0.1, -0.1]], paths = [[0, 1, 2]], convexity = 3);
	translate(v = [0, 0, -1])
		linear_extrude(height = cubeSize + 2, center = false, convexity = 3)
			polygon(points = [[cubeSize * 5 / 8, - 0.1], [cubeSize + 0.1, cubeSize * 3 / 8 + 0.1], [cubeSize + 0.1, -0.1]], paths = [[0, 1, 2]], convexity = 3);
	translate(v = [0, 0, -1])
		linear_extrude(height = cubeSize + 2, center = false, convexity = 3)
			polygon(points = [[cubeSize / 4, cubeSize + 0.1], [cubeSize * 3 / 4, cubeSize + 0.1], [cubeSize / 2, cubeSize * 5 / 8]], paths = [[0, 1, 2]], convexity = 3);
}

module carveLetterW(cubeSize)
{
    // bottom right corner curve
	arc(cubeSize, 270, cubeSize * 3 / 4, -1);
    // bottom left corner curve
	arc(cubeSize, 0, -1, -1);
    // divot
	arcWithMargin(cubeSize, 270, 5, 0.1, cubeSize / 4 + 0.1, -5); // left
	arcWithMargin(cubeSize,   0, 0.1, 5, cubeSize / 2 - 0.1, -5); // right
	// Cutouts
    translate(v = [cubeSize / 4, cubeSize * 3 / 4, -1])
		cube(size = [cubeSize / 8, cubeSize / 4 + 1, cubeSize + 2]);
    translate(v = [cubeSize * 5 / 8, cubeSize * 3 / 4, -1])
		cube(size = [cubeSize / 8, cubeSize / 4 + 1, cubeSize + 2]);
}

module carveLetterX(cubeSize)
{
	translate(v = [cubeSize / 2, 0, -1])
		cylinder(r = cubeSize / 4, h = cubeSize + 2, $fn = DETAIL);
	translate(v = [0, cubeSize / 2, -1])
		cylinder(r = cubeSize / 4, h = cubeSize + 2, $fn = DETAIL);
	translate(v = [cubeSize / 2, cubeSize, -1])
		cylinder(r = cubeSize / 4, h = cubeSize + 2, $fn = DETAIL);
	translate(v = [cubeSize, cubeSize / 2, -1])
		cylinder(r = cubeSize / 4, h = cubeSize + 2, $fn = DETAIL);
}

module carveLetterY(cubeSize)
{
	translate(v = [cubeSize / 2, cubeSize, -1])
		cylinder(r = cubeSize / 4, h = cubeSize + 2, $fn = DETAIL);
	// right arc
	arcWithMargin(cubeSize, 270, 5, 5, cubeSize * 3 / 4, cubeSize / 2 - 5);
	// right cuout
	translate(v = [cubeSize * 3 / 4, -1, -1])
		cube(size = [cubeSize / 4 + 1, cubeSize / 2 + 1, cubeSize + 2]);
	// left arc
	arcWithMargin(cubeSize, 0, 5, 5, -5, cubeSize / 2 - 5);
	// left cuout
	translate(v = [-1, -1, -1])
		cube(size = [cubeSize / 4 + 1, cubeSize / 2 + 1, cubeSize + 2]);
}

module carveLetterYAlt(cubeSize)
{
	translate(v = [cubeSize / 2, cubeSize, -1])
		cylinder(r = cubeSize / 4, h = cubeSize + 2, $fn = DETAIL);
	// right arc
	arcWithMargin(cubeSize, 270, 5, 5, cubeSize * 3 / 4, cubeSize / 2 - 5);
	// right cuout
	translate(v = [cubeSize * 5 / 8, -1, -1])
		cube(size = [cubeSize * 3 / 8 + 1, cubeSize / 2 + 1, cubeSize + 2]);
	// left arc
	arcWithMargin(cubeSize, 0, 5, 5, -5, cubeSize / 2 - 5);
	// left cuout
	translate(v = [-1, -1, -1])
		cube(size = [cubeSize * 3 / 8 + 1, cubeSize / 2 + 1, cubeSize + 2]);
}

module carveLetterZ(cubeSize)
{
    // top right corner curve
	arc(cubeSize, 180, cubeSize * 3 / 4, cubeSize * 3 / 4 + 1);
    // bottom left corner curve
	arc(cubeSize, 0, -1, -1);
    // left
	arcWithMargin(cubeSize,  90, 0, 5, -5, cubeSize * 3 / 8);
	// right
	arcWithMargin(cubeSize, 270, 0, 5, cubeSize * 3 / 4, cubeSize * 3 / 8);
}

module carveLetter(typeface, theLetter, cubeSize)
{
	// Function pointers are fun
    if (theLetter == "A")
        carveLetterA(cubeSize);
    if (theLetter == "B")
        carveLetterB(cubeSize);
    if (theLetter == "C")
	{
		if (typeface == "alternate")
			carveLetterCAlt(cubeSize);
		else
        	carveLetterC(cubeSize);
	}
    if (theLetter == "D")
	{
		if (typeface == "alternate")
			carveLetterDAlt(cubeSize);
		else
        	carveLetterD(cubeSize);
	}
    if (theLetter == "E")
	{
		if (typeface == "alternate")
			carveLetterEAlt(cubeSize);
		else
        	carveLetterE(cubeSize);
	}
    if (theLetter == "F")
	{
		if (typeface == "alternate")
			carveLetterFAlt(cubeSize);
		else
        	carveLetterF(cubeSize);
	}
    if (theLetter == "G")
	{
		if (typeface == "alternate")
			carveLetterGAlt(cubeSize);
		else
        	carveLetterG(cubeSize);
	}
    if (theLetter == "H")
	{
		if (typeface == "alternate")
			carveLetterHAlt(cubeSize);
		else
        	carveLetterH(cubeSize);
	}
    if (theLetter == "I")
	{
		if (typeface == "alternate")
			carveLetterIAlt(cubeSize);
		else
        	carveLetterI(cubeSize);
	}
    if (theLetter == "J")
	{
		if (typeface == "alternate")
			carveLetterJAlt(cubeSize);
		else
        	carveLetterJ(cubeSize);
	}
    if (theLetter == "K")
	{
		if (typeface == "alternate")
			carveLetterKAlt(cubeSize);
		else
        	carveLetterK(cubeSize);
	}
    if (theLetter == "L")
	{
		if (typeface == "alternate")
			carveLetterLAlt(cubeSize);
		else
        	carveLetterL(cubeSize);
	}
    if (theLetter == "M")
        carveLetterM(cubeSize);
    if (theLetter == "N")
        carveLetterN(cubeSize);
    if (theLetter == "O")
	{
		if (typeface == "alternate")
			carveLetterOAlt(cubeSize);
		else
        	carveLetterO(cubeSize);
	}
    if (theLetter == "P")
	{
		if (typeface == "alternate")
			carveLetterPAlt(cubeSize);
		else
        	carveLetterP(cubeSize);
	}
    if (theLetter == "Q")
        carveLetterQ(cubeSize);
    if (theLetter == "R")
        carveLetterR(cubeSize);
    if (theLetter == "S")
        carveLetterS(cubeSize);
    if (theLetter == "T")
       	carveLetterT(cubeSize);
    if (theLetter == "U")
	{
		if (typeface == "alternate")
			carveLetterUAlt(cubeSize);
		else
        	carveLetterU(cubeSize);
	}
    if (theLetter == "V")
        carveLetterV(cubeSize);
    if (theLetter == "W")
        carveLetterW(cubeSize);
    if (theLetter == "X")
        carveLetterX(cubeSize);
    if (theLetter == "Y")
	{
		if (typeface == "alternate")
			carveLetterYAlt(cubeSize);
		else
        	carveLetterY(cubeSize);
	}
    if (theLetter == "Z")
        carveLetterZ(cubeSize);
}
// ----------------------------------------

module carveBlock(typeface, letter1, letter2, letter3)
{
	translate(v = [SIZE / -2, SIZE / -2, 0])
	    difference()
	    {
	        cube(size = [SIZE, SIZE, SIZE]);
	        // Top letter
	        carveLetter(typeface, letter3, SIZE);
	        // Front letter
	        translate(v = [0, SIZE, 0])
	            rotate(a = [90, 0, 0])
	                carveLetter(typeface, letter1, SIZE);
	        // Side letter
	        translate(v = [0, 0, 0])
	            rotate(a = [0, 90, 0])
	                rotate(a = [0, 0, 90])
	                    carveLetter(typeface, letter2, SIZE);
	    }
}

module test()
{
    difference()
    {
        cube(size = [SIZE, SIZE, SIZE]);
        // Top letter
        carveLetterFAlt(SIZE);
    }
}

carveBlock(typeface, left_side_letter, right_side_letter, top_letter);

// Test code:
//carveBlock(typeface, "B", "E", "A");
//carveBlock(typeface, "G", "E", "B");
//test();
